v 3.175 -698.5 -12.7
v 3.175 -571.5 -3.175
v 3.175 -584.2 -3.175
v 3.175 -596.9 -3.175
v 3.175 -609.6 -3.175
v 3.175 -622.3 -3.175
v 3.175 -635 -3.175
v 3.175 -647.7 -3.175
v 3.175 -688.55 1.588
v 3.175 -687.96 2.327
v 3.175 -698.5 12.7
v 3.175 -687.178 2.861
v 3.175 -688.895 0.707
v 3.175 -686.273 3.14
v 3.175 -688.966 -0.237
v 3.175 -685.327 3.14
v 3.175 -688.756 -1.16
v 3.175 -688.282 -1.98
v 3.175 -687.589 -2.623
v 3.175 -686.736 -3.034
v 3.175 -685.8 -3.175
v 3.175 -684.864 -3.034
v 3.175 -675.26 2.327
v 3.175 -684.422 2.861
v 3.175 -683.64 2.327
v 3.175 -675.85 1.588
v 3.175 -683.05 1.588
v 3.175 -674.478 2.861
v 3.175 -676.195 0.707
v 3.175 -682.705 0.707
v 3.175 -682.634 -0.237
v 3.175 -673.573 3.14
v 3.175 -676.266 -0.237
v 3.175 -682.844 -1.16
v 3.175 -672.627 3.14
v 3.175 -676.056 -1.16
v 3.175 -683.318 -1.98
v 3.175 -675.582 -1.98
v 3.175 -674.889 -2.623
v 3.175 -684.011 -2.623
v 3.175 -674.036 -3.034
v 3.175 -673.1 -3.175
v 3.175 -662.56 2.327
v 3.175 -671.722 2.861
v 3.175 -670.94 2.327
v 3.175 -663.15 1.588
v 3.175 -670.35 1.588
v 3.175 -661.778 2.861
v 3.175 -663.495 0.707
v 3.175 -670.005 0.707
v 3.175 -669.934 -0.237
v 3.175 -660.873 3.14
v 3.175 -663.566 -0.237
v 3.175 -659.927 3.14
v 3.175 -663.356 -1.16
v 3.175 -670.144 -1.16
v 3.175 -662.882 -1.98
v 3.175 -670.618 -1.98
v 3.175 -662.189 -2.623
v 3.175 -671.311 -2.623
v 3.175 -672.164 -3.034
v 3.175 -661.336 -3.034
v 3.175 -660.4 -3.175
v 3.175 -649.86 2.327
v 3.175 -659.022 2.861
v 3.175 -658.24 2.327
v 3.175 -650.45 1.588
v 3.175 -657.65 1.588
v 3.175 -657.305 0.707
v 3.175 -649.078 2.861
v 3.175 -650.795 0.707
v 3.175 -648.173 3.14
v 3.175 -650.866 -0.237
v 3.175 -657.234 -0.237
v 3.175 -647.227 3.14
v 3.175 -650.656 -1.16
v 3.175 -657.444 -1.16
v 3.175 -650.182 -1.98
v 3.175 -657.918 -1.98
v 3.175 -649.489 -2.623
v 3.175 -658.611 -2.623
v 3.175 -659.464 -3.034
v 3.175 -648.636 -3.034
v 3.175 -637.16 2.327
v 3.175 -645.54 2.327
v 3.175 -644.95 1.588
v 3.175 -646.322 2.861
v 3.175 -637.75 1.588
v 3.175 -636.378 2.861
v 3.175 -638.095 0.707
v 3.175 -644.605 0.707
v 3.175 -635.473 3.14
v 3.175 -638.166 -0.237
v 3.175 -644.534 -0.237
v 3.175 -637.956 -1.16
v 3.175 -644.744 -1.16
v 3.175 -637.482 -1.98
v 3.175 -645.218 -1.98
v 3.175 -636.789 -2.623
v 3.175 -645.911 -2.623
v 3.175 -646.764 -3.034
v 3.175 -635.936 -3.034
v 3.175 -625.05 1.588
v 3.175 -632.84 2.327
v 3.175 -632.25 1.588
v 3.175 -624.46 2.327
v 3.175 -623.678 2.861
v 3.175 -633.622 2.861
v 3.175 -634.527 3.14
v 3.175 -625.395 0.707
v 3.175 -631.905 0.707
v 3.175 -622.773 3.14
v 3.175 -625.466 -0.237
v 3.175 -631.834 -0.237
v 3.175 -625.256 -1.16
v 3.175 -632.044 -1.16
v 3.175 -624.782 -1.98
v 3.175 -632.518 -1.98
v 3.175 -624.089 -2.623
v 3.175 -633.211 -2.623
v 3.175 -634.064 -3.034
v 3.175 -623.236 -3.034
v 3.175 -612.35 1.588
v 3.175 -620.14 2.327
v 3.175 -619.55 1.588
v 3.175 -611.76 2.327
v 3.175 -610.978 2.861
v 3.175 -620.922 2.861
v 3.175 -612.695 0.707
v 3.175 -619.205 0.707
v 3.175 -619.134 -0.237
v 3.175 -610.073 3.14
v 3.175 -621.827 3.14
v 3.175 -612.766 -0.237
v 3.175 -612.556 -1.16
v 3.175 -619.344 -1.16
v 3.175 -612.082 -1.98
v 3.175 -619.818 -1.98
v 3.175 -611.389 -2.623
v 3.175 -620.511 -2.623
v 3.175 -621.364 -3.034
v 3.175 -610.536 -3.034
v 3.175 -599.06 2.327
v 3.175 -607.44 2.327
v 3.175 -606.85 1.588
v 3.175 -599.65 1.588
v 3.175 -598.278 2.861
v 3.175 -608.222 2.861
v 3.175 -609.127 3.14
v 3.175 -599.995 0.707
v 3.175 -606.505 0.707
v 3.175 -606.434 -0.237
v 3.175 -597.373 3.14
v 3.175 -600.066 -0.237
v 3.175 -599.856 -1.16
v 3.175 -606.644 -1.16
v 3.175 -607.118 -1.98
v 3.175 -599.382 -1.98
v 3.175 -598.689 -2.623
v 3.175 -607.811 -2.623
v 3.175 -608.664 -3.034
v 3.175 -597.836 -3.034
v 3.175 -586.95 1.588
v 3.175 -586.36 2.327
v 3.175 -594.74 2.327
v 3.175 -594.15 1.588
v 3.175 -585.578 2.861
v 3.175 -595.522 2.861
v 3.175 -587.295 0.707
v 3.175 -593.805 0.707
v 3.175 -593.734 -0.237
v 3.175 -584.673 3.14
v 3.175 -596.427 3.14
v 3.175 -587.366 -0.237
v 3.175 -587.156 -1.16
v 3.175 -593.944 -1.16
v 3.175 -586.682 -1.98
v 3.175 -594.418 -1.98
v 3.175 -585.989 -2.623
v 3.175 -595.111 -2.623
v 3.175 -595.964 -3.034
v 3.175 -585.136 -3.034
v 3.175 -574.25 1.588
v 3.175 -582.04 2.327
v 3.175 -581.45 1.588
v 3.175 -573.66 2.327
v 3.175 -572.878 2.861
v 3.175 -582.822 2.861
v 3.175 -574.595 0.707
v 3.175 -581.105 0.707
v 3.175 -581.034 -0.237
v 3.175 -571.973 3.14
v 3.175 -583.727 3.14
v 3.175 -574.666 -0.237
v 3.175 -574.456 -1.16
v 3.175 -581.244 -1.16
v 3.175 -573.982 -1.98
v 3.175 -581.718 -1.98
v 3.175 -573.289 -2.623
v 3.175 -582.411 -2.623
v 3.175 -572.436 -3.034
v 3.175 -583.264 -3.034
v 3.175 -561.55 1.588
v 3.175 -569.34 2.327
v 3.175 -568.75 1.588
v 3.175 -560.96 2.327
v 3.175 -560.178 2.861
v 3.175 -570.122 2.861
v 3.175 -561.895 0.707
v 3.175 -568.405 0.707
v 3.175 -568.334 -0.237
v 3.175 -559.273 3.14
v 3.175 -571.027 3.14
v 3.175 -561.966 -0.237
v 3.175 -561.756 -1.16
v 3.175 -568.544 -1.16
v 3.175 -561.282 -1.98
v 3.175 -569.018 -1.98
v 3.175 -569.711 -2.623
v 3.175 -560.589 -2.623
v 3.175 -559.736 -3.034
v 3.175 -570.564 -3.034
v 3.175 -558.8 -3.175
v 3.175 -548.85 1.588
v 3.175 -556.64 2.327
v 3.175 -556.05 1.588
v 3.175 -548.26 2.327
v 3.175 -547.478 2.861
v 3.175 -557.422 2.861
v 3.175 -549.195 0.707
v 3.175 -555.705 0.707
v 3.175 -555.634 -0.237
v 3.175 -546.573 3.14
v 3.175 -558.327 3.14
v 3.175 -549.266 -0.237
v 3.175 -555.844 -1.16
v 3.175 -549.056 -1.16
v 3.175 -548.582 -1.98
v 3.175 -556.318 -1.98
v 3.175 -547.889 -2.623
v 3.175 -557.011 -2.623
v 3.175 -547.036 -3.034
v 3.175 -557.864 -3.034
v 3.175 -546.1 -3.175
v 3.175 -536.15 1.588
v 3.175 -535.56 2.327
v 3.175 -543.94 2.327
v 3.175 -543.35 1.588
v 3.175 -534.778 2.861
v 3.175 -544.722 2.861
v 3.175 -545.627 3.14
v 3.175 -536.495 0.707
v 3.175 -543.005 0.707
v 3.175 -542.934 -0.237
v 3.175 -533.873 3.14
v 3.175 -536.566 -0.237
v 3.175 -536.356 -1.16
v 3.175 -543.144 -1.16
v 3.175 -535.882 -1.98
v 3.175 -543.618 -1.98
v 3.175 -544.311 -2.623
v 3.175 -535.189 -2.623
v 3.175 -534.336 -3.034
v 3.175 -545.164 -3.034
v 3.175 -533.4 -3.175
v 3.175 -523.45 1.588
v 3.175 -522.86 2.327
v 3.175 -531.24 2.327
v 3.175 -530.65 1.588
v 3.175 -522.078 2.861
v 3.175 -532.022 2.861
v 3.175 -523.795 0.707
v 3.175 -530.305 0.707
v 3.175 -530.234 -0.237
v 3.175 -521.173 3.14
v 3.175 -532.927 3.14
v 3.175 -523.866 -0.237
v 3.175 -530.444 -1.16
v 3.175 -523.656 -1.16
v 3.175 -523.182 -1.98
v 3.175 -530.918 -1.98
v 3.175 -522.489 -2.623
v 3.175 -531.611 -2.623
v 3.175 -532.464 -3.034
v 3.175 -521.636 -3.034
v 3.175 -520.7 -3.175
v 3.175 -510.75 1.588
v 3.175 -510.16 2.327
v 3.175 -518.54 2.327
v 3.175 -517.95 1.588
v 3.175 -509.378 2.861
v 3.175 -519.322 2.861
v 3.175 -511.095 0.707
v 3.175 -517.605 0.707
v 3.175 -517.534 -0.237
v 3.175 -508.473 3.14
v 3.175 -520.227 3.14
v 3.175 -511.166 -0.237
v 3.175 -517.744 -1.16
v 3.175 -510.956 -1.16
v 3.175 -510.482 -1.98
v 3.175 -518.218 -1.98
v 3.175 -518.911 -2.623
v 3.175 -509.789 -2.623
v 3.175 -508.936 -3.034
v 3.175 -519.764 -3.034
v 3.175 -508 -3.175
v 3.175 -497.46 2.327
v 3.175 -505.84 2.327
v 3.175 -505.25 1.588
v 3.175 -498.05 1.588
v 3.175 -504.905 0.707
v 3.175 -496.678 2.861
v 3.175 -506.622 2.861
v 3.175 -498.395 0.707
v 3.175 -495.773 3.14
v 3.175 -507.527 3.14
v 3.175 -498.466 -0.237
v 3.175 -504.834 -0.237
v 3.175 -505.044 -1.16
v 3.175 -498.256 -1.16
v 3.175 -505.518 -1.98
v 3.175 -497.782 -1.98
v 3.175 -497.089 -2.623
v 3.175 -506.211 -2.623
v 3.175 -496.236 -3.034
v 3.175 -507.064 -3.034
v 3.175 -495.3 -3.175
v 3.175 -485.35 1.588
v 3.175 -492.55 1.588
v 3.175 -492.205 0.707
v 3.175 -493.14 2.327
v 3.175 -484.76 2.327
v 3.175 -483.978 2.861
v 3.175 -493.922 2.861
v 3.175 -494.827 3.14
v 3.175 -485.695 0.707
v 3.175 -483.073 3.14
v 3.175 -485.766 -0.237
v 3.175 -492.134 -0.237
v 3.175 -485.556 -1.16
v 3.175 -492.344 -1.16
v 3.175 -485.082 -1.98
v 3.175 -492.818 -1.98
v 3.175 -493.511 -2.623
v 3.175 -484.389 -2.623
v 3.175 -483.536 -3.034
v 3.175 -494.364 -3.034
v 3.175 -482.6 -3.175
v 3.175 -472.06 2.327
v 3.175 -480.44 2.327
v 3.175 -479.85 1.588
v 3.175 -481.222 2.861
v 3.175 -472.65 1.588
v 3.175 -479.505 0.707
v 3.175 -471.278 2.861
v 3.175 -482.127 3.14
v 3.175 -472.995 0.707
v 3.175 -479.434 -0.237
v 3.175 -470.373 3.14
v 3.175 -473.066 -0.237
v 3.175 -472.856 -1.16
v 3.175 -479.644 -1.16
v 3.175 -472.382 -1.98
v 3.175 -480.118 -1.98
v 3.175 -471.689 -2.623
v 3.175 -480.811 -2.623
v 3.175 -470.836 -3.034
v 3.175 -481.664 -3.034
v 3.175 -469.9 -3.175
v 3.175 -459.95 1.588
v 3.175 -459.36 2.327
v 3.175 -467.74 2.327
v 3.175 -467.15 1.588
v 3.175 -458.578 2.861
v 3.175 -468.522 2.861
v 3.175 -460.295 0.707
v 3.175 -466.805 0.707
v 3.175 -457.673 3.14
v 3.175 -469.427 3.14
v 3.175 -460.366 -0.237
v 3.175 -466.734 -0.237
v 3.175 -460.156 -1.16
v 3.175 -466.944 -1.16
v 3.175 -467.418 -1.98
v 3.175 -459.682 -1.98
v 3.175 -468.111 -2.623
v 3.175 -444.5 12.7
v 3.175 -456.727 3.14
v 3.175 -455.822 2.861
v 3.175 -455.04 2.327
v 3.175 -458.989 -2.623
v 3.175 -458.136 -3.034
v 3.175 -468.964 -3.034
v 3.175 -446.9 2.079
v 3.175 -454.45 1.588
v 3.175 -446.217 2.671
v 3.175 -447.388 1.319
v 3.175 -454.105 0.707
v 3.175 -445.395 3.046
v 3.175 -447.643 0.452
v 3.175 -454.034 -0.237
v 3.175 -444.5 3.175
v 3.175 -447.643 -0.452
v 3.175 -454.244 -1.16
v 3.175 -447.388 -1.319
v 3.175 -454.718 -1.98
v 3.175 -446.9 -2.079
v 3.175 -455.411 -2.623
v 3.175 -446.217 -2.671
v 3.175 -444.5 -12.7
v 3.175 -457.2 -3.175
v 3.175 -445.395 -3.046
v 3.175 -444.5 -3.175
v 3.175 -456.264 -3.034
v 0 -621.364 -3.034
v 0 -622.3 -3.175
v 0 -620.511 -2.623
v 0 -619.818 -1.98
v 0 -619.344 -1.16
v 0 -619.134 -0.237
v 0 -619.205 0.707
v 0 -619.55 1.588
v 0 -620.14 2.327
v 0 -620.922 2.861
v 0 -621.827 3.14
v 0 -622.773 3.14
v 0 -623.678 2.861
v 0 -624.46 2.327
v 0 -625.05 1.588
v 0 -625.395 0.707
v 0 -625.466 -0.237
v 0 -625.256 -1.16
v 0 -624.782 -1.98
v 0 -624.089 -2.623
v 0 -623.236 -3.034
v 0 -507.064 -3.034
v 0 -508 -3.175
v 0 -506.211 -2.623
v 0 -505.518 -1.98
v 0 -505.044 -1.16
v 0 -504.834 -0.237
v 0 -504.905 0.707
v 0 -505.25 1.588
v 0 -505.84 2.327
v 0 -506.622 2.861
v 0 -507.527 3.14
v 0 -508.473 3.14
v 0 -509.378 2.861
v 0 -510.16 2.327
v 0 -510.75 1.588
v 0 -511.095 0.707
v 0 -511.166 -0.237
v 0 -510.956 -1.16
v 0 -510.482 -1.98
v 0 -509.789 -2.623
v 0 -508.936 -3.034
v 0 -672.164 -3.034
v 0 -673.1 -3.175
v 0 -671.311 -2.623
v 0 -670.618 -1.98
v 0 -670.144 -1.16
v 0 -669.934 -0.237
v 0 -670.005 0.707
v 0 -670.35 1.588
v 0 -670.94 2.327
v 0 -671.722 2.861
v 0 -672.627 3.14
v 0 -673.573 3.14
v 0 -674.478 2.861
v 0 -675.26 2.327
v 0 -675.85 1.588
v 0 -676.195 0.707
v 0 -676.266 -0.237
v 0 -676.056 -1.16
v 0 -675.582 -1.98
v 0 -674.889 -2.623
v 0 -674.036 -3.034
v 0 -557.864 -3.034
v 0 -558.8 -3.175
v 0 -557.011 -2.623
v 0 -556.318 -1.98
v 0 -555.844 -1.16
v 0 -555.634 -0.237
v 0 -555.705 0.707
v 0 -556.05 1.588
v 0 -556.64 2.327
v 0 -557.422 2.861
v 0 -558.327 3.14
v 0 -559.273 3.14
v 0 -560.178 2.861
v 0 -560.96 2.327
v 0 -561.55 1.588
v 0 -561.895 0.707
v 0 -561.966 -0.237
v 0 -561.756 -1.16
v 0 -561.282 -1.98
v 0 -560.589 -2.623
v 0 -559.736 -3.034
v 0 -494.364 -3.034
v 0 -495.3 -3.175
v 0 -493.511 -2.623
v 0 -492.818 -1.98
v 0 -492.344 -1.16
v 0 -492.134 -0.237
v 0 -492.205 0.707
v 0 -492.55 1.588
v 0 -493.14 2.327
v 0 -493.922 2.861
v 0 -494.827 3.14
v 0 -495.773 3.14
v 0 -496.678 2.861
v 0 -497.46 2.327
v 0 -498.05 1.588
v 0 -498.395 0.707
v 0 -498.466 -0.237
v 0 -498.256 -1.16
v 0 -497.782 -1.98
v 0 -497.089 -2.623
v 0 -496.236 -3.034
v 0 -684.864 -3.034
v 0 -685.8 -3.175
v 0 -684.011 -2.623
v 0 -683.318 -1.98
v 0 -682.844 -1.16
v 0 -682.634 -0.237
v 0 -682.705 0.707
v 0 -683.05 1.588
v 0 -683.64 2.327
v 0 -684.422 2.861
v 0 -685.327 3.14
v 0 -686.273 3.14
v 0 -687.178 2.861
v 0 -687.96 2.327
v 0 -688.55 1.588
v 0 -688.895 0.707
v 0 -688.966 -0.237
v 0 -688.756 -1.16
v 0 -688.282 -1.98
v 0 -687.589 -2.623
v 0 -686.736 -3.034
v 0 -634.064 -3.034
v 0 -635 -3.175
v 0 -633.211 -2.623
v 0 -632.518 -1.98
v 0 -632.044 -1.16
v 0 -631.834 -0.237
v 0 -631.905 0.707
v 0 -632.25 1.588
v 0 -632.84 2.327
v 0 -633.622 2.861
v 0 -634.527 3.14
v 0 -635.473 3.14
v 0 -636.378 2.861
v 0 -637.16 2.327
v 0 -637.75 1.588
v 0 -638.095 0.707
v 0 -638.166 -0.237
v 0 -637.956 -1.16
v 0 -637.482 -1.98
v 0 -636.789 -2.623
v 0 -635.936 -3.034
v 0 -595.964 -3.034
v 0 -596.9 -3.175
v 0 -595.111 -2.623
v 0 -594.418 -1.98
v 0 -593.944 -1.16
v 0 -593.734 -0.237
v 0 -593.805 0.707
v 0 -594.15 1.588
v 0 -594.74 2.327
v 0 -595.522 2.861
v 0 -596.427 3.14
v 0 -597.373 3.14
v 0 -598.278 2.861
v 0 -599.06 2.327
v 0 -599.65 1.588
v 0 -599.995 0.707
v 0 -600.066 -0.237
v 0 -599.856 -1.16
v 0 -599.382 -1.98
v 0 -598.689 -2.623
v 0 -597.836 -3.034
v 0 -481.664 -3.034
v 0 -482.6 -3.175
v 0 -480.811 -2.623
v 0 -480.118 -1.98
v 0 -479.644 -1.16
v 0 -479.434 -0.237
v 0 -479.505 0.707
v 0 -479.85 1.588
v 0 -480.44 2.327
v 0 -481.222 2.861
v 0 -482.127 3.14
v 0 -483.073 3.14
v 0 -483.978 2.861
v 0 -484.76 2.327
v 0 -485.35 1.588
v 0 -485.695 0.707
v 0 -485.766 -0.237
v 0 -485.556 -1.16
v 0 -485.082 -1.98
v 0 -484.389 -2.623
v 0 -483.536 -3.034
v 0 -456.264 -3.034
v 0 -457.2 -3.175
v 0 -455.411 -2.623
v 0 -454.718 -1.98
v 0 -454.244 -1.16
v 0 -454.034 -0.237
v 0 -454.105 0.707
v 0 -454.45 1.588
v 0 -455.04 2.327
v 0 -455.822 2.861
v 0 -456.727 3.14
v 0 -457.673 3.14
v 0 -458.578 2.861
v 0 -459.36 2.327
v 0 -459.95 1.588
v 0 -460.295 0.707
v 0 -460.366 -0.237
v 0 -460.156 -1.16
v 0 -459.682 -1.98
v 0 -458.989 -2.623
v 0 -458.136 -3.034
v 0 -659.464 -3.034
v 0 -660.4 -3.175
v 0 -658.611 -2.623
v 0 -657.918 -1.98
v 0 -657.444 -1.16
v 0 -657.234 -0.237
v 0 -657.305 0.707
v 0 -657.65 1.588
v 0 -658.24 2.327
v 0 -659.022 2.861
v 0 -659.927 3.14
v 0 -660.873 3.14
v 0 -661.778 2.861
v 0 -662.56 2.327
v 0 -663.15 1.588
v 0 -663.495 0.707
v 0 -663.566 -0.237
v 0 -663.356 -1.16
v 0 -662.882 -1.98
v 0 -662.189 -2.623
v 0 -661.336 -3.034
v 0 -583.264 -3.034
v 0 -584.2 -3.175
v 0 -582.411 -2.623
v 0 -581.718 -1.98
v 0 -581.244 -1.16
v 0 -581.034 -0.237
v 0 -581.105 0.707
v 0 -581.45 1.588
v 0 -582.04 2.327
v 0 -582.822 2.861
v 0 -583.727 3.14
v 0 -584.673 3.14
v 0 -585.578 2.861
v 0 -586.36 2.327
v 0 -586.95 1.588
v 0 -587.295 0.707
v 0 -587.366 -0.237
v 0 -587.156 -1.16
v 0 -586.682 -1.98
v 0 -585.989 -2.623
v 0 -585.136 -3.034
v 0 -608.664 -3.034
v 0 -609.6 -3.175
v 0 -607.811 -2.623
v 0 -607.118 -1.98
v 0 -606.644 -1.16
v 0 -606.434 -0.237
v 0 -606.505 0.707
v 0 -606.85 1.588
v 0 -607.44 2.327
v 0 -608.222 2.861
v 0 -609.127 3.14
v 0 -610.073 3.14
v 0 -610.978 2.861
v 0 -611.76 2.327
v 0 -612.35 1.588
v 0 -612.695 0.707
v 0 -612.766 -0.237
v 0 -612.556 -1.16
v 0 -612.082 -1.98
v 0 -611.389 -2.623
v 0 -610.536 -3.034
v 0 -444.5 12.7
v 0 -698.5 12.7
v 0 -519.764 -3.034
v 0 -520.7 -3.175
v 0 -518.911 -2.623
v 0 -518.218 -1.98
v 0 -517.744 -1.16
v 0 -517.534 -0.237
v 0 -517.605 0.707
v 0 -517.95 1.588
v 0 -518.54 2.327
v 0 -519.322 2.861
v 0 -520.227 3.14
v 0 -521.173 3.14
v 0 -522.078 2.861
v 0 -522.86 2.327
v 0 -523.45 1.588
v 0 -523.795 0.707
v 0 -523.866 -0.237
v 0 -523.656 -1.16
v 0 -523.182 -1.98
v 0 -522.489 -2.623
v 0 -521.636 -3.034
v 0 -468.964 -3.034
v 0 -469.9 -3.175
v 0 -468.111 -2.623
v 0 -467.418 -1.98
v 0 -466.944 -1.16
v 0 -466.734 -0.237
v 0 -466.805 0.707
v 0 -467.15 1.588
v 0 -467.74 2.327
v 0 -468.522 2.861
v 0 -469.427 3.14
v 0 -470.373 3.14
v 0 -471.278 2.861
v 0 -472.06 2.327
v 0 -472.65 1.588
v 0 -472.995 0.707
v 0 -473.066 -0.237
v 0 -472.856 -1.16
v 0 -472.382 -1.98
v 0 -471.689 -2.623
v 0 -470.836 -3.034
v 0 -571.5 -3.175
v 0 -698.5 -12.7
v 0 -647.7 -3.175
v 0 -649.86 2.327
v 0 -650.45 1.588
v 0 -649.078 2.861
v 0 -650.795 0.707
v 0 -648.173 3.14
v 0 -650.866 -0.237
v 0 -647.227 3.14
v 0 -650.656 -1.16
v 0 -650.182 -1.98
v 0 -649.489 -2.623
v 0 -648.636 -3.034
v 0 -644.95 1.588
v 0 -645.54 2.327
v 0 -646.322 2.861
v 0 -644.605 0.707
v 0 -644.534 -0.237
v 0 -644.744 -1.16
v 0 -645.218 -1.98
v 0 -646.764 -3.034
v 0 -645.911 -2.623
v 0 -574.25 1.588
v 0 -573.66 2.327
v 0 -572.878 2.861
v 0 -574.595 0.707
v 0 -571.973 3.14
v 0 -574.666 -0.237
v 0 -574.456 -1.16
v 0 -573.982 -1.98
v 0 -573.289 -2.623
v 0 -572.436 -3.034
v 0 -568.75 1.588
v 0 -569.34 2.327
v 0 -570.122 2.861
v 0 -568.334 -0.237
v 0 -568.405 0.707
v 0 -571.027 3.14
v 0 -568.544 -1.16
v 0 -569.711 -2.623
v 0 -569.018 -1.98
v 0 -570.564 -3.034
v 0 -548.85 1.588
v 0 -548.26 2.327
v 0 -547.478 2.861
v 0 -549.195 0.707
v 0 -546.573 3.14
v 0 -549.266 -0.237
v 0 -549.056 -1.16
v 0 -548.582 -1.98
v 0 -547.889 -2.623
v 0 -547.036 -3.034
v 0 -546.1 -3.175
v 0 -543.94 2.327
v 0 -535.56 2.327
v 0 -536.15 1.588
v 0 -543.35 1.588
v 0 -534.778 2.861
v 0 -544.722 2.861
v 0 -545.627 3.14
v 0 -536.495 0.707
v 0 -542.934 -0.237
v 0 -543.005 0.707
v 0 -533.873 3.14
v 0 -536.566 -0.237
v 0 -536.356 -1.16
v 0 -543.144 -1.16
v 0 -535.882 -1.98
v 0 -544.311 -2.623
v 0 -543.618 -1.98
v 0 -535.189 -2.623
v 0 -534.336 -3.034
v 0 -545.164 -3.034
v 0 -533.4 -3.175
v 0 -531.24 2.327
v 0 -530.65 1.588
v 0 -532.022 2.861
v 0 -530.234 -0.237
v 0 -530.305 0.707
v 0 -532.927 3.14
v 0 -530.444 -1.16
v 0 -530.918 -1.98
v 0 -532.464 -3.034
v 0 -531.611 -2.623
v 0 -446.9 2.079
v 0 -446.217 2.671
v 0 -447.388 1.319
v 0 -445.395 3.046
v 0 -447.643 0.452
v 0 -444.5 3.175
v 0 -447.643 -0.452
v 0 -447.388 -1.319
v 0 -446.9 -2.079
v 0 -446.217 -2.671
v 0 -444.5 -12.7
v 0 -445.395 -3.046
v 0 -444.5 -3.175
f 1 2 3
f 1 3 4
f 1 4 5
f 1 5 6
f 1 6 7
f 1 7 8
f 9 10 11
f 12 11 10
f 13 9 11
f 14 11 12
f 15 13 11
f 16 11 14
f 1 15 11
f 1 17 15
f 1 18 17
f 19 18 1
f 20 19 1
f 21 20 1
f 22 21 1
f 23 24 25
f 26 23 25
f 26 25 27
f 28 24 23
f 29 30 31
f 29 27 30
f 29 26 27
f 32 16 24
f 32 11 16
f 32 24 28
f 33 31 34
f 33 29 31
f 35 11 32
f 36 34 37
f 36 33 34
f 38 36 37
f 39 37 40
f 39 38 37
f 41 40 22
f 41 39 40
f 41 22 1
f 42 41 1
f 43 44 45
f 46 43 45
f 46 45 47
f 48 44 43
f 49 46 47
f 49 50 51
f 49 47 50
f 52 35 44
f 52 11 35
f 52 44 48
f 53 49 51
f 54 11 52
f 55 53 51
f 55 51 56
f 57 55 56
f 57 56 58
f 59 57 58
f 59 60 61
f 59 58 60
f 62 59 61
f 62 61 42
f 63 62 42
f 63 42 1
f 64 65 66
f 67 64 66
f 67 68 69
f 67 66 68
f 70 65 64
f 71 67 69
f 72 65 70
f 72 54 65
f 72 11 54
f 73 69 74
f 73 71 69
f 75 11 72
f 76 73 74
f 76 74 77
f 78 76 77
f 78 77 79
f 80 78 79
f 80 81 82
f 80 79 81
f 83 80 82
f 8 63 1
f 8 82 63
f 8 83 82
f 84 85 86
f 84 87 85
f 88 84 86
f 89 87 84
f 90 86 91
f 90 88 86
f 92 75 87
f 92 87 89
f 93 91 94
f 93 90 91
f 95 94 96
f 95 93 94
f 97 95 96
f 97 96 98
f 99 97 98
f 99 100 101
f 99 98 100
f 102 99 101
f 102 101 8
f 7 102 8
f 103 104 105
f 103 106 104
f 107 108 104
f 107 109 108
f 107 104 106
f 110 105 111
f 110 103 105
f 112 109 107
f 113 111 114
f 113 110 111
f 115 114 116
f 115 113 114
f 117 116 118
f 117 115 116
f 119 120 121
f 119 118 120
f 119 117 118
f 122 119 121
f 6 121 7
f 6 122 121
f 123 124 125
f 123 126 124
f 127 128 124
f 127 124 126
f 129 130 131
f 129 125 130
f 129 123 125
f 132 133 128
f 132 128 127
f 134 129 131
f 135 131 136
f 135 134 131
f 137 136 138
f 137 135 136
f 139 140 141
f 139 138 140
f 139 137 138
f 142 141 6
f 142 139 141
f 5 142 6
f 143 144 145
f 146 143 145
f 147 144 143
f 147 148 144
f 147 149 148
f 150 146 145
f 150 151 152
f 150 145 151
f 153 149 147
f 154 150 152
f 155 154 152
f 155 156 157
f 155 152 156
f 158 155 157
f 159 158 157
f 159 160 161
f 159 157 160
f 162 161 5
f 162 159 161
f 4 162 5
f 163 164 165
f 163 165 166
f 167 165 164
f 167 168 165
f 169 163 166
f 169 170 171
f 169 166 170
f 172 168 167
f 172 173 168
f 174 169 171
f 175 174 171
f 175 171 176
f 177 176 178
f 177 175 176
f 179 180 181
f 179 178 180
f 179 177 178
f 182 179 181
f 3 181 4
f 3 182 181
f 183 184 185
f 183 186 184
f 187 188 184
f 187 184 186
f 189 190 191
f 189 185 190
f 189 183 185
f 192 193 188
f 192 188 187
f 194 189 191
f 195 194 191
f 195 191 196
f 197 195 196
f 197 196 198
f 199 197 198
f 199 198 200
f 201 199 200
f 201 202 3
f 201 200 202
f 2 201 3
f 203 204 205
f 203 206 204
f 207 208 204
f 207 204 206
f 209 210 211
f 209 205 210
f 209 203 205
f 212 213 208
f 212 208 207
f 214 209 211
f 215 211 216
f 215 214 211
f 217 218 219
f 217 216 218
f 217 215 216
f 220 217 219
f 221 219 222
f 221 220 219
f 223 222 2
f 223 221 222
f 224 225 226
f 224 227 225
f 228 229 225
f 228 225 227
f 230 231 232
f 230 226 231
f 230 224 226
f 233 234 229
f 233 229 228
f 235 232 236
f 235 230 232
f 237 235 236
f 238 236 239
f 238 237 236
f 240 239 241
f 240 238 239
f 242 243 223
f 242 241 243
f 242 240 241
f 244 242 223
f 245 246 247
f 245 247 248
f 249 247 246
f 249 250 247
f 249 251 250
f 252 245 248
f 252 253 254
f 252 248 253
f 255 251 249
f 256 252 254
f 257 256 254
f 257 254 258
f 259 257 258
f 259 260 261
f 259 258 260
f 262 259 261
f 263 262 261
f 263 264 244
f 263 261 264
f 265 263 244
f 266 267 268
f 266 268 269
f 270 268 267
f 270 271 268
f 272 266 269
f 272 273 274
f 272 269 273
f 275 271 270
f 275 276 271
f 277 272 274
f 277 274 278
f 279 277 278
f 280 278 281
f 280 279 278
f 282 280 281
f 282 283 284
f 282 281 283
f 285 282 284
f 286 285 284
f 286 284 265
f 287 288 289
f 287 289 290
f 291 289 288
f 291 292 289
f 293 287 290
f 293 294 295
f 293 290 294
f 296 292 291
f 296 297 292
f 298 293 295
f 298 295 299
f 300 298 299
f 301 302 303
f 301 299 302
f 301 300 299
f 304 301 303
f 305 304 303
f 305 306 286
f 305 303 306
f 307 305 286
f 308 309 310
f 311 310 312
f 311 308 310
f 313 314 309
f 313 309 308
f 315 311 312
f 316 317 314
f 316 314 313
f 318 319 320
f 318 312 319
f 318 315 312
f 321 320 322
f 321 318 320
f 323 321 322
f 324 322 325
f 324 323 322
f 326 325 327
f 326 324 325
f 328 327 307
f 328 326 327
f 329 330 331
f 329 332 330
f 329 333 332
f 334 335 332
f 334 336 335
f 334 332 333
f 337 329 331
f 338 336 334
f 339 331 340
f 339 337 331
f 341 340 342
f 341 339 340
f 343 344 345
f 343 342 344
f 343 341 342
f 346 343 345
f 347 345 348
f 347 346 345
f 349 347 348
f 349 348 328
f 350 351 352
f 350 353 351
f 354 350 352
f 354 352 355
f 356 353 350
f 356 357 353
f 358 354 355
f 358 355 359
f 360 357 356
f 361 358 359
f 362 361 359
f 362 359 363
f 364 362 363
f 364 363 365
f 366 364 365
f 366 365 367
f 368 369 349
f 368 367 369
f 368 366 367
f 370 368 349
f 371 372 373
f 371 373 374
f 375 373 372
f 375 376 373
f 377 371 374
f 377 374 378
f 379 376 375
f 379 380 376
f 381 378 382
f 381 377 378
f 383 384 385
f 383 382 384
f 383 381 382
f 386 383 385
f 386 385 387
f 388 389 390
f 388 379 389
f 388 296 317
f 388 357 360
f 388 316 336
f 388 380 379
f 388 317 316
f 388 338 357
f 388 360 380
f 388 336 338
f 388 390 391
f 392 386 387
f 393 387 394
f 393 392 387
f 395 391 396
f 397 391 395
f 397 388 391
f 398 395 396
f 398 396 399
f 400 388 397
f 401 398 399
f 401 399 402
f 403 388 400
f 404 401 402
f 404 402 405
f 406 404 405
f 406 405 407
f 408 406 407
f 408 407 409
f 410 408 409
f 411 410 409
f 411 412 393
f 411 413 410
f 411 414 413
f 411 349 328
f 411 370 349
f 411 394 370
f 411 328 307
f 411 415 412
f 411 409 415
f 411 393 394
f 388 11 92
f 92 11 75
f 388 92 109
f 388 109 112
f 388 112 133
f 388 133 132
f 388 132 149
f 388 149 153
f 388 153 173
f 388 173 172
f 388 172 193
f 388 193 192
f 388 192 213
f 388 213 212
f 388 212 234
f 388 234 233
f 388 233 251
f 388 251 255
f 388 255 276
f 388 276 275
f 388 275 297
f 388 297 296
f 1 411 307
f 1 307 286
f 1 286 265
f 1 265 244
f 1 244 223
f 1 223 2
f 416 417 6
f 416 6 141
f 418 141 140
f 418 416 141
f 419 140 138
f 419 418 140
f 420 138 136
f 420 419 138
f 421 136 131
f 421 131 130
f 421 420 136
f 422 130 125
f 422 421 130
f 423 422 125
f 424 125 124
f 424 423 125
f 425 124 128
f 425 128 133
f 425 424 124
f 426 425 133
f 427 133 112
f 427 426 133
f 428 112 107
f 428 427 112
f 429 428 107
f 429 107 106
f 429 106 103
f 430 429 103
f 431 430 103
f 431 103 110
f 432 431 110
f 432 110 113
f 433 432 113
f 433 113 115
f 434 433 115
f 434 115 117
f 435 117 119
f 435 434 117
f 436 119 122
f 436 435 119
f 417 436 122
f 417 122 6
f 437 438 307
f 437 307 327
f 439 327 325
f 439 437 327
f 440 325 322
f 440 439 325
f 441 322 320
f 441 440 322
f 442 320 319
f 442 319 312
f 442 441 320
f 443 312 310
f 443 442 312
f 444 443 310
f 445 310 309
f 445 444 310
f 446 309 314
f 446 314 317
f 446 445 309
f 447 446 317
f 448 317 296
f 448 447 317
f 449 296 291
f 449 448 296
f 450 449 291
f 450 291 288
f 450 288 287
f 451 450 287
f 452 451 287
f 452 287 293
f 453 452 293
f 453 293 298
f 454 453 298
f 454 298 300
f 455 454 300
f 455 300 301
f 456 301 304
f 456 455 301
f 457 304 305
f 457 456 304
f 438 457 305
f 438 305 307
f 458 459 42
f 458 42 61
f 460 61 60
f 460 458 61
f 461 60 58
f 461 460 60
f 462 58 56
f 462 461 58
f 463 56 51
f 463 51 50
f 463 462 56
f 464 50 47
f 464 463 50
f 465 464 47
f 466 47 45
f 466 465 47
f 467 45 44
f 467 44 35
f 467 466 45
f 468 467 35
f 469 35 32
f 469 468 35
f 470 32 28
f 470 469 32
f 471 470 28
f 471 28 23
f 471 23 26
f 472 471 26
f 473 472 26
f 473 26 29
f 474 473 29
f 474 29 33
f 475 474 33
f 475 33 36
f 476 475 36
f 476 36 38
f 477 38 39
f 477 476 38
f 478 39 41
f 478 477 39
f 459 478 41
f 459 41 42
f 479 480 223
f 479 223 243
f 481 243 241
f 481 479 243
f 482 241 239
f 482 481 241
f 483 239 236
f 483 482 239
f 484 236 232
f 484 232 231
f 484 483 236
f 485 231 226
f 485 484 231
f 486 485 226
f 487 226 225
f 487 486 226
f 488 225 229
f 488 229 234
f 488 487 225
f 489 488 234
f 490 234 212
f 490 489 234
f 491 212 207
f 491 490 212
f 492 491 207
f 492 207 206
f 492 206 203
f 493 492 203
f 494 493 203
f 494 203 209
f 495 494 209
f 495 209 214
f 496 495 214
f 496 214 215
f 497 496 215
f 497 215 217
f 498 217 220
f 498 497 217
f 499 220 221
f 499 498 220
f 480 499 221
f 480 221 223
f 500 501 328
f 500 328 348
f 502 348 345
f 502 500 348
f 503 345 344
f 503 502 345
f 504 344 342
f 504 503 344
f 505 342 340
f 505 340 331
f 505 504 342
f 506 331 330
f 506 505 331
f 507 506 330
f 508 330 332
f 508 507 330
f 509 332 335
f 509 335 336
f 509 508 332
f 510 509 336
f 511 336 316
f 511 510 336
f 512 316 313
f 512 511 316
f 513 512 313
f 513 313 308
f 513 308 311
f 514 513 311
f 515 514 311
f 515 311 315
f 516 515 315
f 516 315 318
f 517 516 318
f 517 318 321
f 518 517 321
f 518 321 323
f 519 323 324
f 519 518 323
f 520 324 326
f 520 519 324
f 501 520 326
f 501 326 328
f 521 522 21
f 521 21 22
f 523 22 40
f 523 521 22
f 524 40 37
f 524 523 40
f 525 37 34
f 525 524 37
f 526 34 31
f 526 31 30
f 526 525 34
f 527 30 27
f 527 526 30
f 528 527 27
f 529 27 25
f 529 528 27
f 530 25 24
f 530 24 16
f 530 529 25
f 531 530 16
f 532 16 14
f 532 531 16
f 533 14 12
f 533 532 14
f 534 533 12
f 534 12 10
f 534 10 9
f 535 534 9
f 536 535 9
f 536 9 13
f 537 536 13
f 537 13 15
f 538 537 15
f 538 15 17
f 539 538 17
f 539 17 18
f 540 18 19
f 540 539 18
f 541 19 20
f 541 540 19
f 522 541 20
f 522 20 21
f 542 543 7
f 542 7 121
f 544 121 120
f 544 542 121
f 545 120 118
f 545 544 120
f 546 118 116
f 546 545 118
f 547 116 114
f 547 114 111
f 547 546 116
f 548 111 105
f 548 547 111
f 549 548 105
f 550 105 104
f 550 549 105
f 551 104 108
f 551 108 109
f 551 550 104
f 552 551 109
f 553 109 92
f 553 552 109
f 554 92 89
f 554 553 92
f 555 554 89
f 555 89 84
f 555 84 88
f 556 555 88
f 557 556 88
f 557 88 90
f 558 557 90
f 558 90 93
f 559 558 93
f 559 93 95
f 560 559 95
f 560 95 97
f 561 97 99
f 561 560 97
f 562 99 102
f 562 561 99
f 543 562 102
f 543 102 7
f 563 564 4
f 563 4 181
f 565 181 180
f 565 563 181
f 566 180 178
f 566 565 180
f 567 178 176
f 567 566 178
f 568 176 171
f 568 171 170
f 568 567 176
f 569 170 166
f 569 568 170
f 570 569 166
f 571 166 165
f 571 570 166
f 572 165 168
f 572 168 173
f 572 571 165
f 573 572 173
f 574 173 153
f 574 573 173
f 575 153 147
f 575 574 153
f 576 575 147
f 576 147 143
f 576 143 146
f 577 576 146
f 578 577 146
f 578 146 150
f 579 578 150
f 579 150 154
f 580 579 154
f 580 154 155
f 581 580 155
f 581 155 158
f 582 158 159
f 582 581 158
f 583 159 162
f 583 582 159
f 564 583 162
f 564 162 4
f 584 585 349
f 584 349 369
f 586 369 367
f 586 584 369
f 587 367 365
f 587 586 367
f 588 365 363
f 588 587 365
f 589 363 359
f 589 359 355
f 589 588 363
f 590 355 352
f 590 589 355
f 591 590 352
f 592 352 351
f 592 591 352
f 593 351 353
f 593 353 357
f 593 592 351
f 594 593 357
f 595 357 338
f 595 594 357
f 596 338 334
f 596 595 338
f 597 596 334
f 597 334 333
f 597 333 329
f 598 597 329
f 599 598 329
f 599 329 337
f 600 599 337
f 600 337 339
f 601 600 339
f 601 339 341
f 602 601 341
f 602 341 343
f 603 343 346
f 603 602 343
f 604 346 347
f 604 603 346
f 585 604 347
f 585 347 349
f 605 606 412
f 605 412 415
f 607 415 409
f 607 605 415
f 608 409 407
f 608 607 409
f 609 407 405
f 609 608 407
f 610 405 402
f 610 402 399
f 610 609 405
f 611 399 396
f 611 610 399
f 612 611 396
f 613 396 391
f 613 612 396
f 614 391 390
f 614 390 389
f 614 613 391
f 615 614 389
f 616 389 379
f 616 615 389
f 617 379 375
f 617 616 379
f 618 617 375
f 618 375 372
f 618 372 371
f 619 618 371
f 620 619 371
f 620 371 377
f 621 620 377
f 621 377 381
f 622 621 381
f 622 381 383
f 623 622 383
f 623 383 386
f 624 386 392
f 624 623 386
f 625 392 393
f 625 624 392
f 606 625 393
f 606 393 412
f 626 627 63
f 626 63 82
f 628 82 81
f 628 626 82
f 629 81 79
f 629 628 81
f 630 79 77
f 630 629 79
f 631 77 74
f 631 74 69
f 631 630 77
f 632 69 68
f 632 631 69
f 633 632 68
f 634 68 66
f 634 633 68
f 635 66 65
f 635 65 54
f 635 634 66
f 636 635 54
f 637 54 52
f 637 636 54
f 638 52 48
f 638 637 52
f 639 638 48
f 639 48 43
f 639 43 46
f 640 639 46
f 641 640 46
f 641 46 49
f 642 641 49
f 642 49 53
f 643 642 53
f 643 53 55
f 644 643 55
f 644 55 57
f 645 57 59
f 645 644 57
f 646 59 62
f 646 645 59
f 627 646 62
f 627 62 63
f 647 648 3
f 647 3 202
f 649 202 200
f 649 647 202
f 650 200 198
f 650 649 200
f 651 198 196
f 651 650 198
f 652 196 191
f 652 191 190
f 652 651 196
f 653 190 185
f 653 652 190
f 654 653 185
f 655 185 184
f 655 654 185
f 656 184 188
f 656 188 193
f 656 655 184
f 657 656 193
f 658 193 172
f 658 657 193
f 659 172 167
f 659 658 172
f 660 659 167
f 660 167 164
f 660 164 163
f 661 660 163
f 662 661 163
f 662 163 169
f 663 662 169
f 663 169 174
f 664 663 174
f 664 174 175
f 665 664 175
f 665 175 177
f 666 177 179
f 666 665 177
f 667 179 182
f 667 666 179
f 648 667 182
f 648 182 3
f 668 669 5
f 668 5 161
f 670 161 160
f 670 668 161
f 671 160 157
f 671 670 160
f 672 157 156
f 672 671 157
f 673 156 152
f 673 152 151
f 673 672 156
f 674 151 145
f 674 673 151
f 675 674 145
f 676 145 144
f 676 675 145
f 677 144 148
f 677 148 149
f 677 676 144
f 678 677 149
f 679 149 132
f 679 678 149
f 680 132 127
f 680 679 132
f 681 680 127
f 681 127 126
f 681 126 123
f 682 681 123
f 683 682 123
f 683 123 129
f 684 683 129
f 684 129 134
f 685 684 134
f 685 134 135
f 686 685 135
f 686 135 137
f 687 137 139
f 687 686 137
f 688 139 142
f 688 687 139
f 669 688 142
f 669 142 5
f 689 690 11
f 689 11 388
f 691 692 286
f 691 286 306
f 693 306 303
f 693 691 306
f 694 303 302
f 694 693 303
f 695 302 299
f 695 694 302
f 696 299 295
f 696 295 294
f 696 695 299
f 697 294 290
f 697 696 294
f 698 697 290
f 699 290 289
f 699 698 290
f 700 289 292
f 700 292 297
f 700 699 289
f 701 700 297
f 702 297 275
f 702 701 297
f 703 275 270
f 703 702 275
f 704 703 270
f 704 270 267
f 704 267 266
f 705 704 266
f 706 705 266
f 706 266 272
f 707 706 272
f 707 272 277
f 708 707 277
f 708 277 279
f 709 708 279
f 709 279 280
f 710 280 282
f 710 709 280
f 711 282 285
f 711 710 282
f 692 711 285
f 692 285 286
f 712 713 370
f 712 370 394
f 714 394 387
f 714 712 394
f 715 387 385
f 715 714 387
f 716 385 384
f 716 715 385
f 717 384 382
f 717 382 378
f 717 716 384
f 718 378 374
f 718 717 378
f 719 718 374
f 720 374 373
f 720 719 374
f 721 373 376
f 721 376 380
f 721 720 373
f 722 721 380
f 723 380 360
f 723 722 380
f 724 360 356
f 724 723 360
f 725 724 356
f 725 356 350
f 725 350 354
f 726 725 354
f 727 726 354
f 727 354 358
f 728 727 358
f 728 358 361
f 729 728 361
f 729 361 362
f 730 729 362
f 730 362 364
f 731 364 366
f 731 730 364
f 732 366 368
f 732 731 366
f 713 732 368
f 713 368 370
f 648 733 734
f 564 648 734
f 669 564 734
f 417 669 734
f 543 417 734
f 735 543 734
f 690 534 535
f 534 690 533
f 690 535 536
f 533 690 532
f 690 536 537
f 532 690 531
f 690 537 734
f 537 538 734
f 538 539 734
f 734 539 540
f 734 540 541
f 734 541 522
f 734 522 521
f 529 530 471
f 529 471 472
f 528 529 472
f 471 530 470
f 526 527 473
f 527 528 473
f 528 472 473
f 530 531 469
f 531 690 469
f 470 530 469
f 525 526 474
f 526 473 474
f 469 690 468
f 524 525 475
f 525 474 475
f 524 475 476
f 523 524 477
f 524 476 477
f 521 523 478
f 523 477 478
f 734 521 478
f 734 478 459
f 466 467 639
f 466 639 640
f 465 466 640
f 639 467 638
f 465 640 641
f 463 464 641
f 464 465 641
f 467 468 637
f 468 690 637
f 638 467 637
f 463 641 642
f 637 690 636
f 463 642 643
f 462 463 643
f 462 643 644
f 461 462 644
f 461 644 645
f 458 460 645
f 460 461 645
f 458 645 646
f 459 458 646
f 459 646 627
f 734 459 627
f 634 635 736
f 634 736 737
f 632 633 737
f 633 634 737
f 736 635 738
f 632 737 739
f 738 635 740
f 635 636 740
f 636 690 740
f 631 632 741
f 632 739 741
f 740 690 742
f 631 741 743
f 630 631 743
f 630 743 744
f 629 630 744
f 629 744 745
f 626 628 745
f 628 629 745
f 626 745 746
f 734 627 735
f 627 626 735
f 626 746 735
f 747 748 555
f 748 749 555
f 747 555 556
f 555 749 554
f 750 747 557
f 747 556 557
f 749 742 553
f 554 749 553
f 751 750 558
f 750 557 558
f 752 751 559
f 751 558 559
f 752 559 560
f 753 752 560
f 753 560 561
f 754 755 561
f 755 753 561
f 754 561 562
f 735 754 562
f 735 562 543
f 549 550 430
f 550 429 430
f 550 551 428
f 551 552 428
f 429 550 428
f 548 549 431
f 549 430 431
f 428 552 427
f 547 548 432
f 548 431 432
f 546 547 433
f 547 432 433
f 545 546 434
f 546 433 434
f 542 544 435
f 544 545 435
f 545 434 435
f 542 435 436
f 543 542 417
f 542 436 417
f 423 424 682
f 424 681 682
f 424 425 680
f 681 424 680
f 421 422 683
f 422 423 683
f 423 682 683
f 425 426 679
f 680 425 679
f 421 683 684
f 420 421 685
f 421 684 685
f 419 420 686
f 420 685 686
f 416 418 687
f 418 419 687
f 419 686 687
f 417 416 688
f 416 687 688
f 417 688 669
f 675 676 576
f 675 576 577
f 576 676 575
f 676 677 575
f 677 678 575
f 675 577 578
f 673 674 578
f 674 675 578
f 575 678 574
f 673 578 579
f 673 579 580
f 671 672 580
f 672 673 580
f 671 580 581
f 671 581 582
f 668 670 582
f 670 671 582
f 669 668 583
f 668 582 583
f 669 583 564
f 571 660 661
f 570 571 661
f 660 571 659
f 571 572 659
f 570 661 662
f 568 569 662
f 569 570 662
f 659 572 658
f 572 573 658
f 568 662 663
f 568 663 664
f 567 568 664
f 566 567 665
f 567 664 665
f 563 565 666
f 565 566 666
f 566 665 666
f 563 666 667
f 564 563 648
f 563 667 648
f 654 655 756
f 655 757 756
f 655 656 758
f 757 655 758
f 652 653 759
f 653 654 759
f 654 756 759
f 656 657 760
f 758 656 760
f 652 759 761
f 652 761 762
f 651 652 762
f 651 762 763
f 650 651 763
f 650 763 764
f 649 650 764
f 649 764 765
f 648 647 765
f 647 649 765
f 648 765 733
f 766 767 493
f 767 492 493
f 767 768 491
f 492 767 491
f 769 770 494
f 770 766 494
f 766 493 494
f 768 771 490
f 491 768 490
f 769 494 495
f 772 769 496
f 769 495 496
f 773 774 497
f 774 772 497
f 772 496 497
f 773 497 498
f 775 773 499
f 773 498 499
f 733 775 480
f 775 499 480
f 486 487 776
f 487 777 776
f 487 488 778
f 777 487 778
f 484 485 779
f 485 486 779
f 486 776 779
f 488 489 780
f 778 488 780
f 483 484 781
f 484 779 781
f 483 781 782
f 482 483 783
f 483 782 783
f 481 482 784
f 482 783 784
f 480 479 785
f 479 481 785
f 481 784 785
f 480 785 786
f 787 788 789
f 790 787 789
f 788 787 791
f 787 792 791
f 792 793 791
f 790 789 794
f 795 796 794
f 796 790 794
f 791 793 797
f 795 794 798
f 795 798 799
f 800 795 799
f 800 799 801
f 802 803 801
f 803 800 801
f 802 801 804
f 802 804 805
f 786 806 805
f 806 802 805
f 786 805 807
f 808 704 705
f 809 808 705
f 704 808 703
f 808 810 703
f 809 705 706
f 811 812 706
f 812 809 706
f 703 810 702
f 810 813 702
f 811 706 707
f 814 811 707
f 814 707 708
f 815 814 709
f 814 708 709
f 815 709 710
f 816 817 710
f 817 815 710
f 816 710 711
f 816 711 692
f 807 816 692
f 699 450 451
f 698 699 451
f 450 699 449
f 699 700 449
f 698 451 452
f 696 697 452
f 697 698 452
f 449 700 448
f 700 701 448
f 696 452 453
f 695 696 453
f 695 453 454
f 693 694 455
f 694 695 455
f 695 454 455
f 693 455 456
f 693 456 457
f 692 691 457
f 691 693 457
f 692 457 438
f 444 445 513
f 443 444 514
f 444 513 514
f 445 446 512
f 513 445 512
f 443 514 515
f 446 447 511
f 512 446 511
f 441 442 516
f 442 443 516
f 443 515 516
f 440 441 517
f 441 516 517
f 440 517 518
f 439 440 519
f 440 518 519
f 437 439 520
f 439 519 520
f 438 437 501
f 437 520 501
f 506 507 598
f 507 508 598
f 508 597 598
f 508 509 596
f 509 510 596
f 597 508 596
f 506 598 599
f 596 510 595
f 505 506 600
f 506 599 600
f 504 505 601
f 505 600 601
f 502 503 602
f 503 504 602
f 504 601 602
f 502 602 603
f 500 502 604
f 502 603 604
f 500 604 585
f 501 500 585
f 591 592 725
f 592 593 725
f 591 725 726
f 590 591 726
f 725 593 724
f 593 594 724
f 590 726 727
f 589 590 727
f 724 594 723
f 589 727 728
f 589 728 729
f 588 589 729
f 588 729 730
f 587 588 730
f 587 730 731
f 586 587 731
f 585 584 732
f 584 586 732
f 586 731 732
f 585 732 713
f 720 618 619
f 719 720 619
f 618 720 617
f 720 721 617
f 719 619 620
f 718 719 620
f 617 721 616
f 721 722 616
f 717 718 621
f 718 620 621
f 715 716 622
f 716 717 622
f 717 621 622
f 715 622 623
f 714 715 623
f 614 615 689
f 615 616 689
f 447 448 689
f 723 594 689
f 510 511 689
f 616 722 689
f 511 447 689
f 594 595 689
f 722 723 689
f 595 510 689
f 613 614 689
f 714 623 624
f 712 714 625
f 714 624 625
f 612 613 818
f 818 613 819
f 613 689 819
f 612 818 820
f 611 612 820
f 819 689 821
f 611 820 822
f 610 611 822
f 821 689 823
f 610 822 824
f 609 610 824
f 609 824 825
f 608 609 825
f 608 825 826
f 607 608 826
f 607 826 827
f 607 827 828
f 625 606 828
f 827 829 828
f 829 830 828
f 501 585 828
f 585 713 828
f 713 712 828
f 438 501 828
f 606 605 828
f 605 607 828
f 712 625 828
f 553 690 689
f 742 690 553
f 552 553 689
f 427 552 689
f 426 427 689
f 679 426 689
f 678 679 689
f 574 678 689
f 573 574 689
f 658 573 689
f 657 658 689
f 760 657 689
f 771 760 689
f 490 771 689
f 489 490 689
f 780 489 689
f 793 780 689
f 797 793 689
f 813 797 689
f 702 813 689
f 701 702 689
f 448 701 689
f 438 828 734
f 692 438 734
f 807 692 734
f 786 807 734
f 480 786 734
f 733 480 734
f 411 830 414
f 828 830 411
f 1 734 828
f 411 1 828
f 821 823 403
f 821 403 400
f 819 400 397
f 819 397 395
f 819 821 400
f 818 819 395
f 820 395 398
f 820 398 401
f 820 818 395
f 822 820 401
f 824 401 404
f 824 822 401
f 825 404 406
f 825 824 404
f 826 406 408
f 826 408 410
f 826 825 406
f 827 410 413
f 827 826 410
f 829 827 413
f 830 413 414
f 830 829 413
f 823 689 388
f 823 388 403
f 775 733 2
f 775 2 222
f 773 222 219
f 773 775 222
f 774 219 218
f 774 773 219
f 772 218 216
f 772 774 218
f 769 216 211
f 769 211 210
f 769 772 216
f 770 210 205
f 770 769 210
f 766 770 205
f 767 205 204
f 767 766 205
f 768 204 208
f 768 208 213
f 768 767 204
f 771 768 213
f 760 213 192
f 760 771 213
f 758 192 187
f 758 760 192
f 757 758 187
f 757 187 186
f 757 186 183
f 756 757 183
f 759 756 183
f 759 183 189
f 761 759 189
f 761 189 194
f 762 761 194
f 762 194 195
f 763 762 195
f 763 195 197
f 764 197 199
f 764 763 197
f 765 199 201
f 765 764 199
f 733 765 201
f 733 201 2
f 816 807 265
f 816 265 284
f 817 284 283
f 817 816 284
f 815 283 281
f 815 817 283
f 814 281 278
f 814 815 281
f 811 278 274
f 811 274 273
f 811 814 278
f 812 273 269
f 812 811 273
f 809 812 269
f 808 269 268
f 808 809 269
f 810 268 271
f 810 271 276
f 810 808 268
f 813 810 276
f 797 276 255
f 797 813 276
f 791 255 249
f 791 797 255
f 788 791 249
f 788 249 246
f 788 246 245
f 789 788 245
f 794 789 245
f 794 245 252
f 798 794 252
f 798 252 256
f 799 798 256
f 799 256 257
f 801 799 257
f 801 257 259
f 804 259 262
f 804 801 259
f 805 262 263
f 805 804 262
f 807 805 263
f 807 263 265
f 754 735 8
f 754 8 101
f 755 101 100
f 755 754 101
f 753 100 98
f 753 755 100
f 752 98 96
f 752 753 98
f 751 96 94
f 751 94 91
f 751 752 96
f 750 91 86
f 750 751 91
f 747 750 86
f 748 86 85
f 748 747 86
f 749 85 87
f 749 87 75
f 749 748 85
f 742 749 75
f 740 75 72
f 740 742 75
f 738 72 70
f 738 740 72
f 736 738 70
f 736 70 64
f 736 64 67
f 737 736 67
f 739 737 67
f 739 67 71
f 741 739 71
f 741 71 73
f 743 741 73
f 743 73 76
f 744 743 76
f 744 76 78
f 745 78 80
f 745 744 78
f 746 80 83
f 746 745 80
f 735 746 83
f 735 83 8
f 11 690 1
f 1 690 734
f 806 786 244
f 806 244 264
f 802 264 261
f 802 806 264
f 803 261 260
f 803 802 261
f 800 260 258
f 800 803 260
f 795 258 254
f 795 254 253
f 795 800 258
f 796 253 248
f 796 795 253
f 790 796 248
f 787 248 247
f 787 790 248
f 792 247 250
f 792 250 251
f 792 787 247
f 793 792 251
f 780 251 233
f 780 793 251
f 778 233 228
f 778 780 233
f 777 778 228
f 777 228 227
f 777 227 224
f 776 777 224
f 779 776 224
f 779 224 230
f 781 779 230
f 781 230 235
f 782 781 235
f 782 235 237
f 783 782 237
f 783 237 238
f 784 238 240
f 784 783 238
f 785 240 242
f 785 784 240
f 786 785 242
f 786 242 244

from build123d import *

# Parameters (mm, degrees)
SKETCH1_W               = 25.4
SKETCH1_H               = 1397
SKETCH1_R               = 3.175
BOSS_EXTRUDE1_DEPTH     = 3.175
CUT_EXTRUDE1_DEPTH      = 699.622659685
CUT_EXTRUDE1_DEPTH_BACK = 699.622659685
SKETCH2_W               = 25.4
SKETCH2_H               = 1143


with BuildPart() as part:
    # Sketch1 → Boss-Extrude1 (new body)
    with BuildSketch(Plane(origin=(0, 0, 0), x_dir=(0, 0, -1), z_dir=(1, 0, 0))):
        Rectangle(SKETCH1_W, SKETCH1_H)
        with Locations((0, -685.8)):
            Circle(SKETCH1_R, mode=Mode.SUBTRACT)
        with Locations((0, -673.1)):
            Circle(SKETCH1_R, mode=Mode.SUBTRACT)
        with Locations((0, -660.4)):
            Circle(SKETCH1_R, mode=Mode.SUBTRACT)
        with Locations((0, -647.7)):
            Circle(SKETCH1_R, mode=Mode.SUBTRACT)
        with Locations((0, -635)):
            Circle(SKETCH1_R, mode=Mode.SUBTRACT)
        with Locations((0, -622.3)):
            Circle(SKETCH1_R, mode=Mode.SUBTRACT)
        with Locations((0, -609.6)):
            Circle(SKETCH1_R, mode=Mode.SUBTRACT)
        with Locations((0, -596.9)):
            Circle(SKETCH1_R, mode=Mode.SUBTRACT)
        with Locations((0, -584.2)):
            Circle(SKETCH1_R, mode=Mode.SUBTRACT)
        with Locations((0, -571.5)):
            Circle(SKETCH1_R, mode=Mode.SUBTRACT)
        with Locations((0, -558.8)):
            Circle(SKETCH1_R, mode=Mode.SUBTRACT)
        with Locations((0, -546.1)):
            Circle(SKETCH1_R, mode=Mode.SUBTRACT)
        with Locations((0, -533.4)):
            Circle(SKETCH1_R, mode=Mode.SUBTRACT)
        with Locations((0, -520.7)):
            Circle(SKETCH1_R, mode=Mode.SUBTRACT)
        with Locations((0, -508)):
            Circle(SKETCH1_R, mode=Mode.SUBTRACT)
        with Locations((0, -495.3)):
            Circle(SKETCH1_R, mode=Mode.SUBTRACT)
        with Locations((0, -482.6)):
            Circle(SKETCH1_R, mode=Mode.SUBTRACT)
        with Locations((0, -469.9)):
            Circle(SKETCH1_R, mode=Mode.SUBTRACT)
        with Locations((0, -457.2)):
            Circle(SKETCH1_R, mode=Mode.SUBTRACT)
        with Locations((0, -444.5)):
            Circle(SKETCH1_R, mode=Mode.SUBTRACT)
        with Locations((0, -431.8)):
            Circle(SKETCH1_R, mode=Mode.SUBTRACT)
        with Locations((0, -419.1)):
            Circle(SKETCH1_R, mode=Mode.SUBTRACT)
        with Locations((0, -406.4)):
            Circle(SKETCH1_R, mode=Mode.SUBTRACT)
        with Locations((0, -393.7)):
            Circle(SKETCH1_R, mode=Mode.SUBTRACT)
        with Locations((0, -381)):
            Circle(SKETCH1_R, mode=Mode.SUBTRACT)
        with Locations((0, -368.3)):
            Circle(SKETCH1_R, mode=Mode.SUBTRACT)
        with Locations((0, -355.6)):
            Circle(SKETCH1_R, mode=Mode.SUBTRACT)
        with Locations((0, -342.9)):
            Circle(SKETCH1_R, mode=Mode.SUBTRACT)
        with Locations((0, -330.2)):
            Circle(SKETCH1_R, mode=Mode.SUBTRACT)
        with Locations((0, -317.5)):
            Circle(SKETCH1_R, mode=Mode.SUBTRACT)
        with Locations((0, -304.8)):
            Circle(SKETCH1_R, mode=Mode.SUBTRACT)
        with Locations((0, -292.1)):
            Circle(SKETCH1_R, mode=Mode.SUBTRACT)
        with Locations((0, -279.4)):
            Circle(SKETCH1_R, mode=Mode.SUBTRACT)
        with Locations((0, -266.7)):
            Circle(SKETCH1_R, mode=Mode.SUBTRACT)
        with Locations((0, -254)):
            Circle(SKETCH1_R, mode=Mode.SUBTRACT)
        with Locations((0, -241.3)):
            Circle(SKETCH1_R, mode=Mode.SUBTRACT)
        with Locations((0, -228.6)):
            Circle(SKETCH1_R, mode=Mode.SUBTRACT)
        with Locations((0, -215.9)):
            Circle(SKETCH1_R, mode=Mode.SUBTRACT)
        with Locations((0, -203.2)):
            Circle(SKETCH1_R, mode=Mode.SUBTRACT)
        with Locations((0, -190.5)):
            Circle(SKETCH1_R, mode=Mode.SUBTRACT)
        with Locations((0, -177.8)):
            Circle(SKETCH1_R, mode=Mode.SUBTRACT)
        with Locations((0, -165.1)):
            Circle(SKETCH1_R, mode=Mode.SUBTRACT)
        with Locations((0, -152.4)):
            Circle(SKETCH1_R, mode=Mode.SUBTRACT)
        with Locations((0, -139.7)):
            Circle(SKETCH1_R, mode=Mode.SUBTRACT)
        with Locations((0, -127)):
            Circle(SKETCH1_R, mode=Mode.SUBTRACT)
        with Locations((0, -114.3)):
            Circle(SKETCH1_R, mode=Mode.SUBTRACT)
        with Locations((0, -101.6)):
            Circle(SKETCH1_R, mode=Mode.SUBTRACT)
        with Locations((0, -88.9)):
            Circle(SKETCH1_R, mode=Mode.SUBTRACT)
        with Locations((0, -76.2)):
            Circle(SKETCH1_R, mode=Mode.SUBTRACT)
        with Locations((0, -63.5)):
            Circle(SKETCH1_R, mode=Mode.SUBTRACT)
        with Locations((0, -50.8)):
            Circle(SKETCH1_R, mode=Mode.SUBTRACT)
        with Locations((0, -38.1)):
            Circle(SKETCH1_R, mode=Mode.SUBTRACT)
        with Locations((0, -25.4)):
            Circle(SKETCH1_R, mode=Mode.SUBTRACT)
        with Locations((0, -12.7)):
            Circle(SKETCH1_R, mode=Mode.SUBTRACT)
        Circle(SKETCH1_R, mode=Mode.SUBTRACT)
        with Locations((0, 12.7)):
            Circle(SKETCH1_R, mode=Mode.SUBTRACT)
        with Locations((0, 25.4)):
            Circle(SKETCH1_R, mode=Mode.SUBTRACT)
        with Locations((0, 38.1)):
            Circle(SKETCH1_R, mode=Mode.SUBTRACT)
        with Locations((0, 50.8)):
            Circle(SKETCH1_R, mode=Mode.SUBTRACT)
        with Locations((0, 63.5)):
            Circle(SKETCH1_R, mode=Mode.SUBTRACT)
        with Locations((0, 76.2)):
            Circle(SKETCH1_R, mode=Mode.SUBTRACT)
        with Locations((0, 88.9)):
            Circle(SKETCH1_R, mode=Mode.SUBTRACT)
        with Locations((0, 101.6)):
            Circle(SKETCH1_R, mode=Mode.SUBTRACT)
        with Locations((0, 114.3)):
            Circle(SKETCH1_R, mode=Mode.SUBTRACT)
        with Locations((0, 127)):
            Circle(SKETCH1_R, mode=Mode.SUBTRACT)
        with Locations((0, 139.7)):
            Circle(SKETCH1_R, mode=Mode.SUBTRACT)
        with Locations((0, 152.4)):
            Circle(SKETCH1_R, mode=Mode.SUBTRACT)
        with Locations((0, 165.1)):
            Circle(SKETCH1_R, mode=Mode.SUBTRACT)
        with Locations((0, 177.8)):
            Circle(SKETCH1_R, mode=Mode.SUBTRACT)
        with Locations((0, 190.5)):
            Circle(SKETCH1_R, mode=Mode.SUBTRACT)
        with Locations((0, 203.2)):
            Circle(SKETCH1_R, mode=Mode.SUBTRACT)
        with Locations((0, 215.9)):
            Circle(SKETCH1_R, mode=Mode.SUBTRACT)
        with Locations((0, 228.6)):
            Circle(SKETCH1_R, mode=Mode.SUBTRACT)
        with Locations((0, 241.3)):
            Circle(SKETCH1_R, mode=Mode.SUBTRACT)
        with Locations((0, 254)):
            Circle(SKETCH1_R, mode=Mode.SUBTRACT)
        with Locations((0, 266.7)):
            Circle(SKETCH1_R, mode=Mode.SUBTRACT)
        with Locations((0, 279.4)):
            Circle(SKETCH1_R, mode=Mode.SUBTRACT)
        with Locations((0, 292.1)):
            Circle(SKETCH1_R, mode=Mode.SUBTRACT)
        with Locations((0, 304.8)):
            Circle(SKETCH1_R, mode=Mode.SUBTRACT)
        with Locations((0, 317.5)):
            Circle(SKETCH1_R, mode=Mode.SUBTRACT)
        with Locations((0, 330.2)):
            Circle(SKETCH1_R, mode=Mode.SUBTRACT)
        with Locations((0, 342.9)):
            Circle(SKETCH1_R, mode=Mode.SUBTRACT)
        with Locations((0, 355.6)):
            Circle(SKETCH1_R, mode=Mode.SUBTRACT)
        with Locations((0, 368.3)):
            Circle(SKETCH1_R, mode=Mode.SUBTRACT)
        with Locations((0, 381)):
            Circle(SKETCH1_R, mode=Mode.SUBTRACT)
        with Locations((0, 393.7)):
            Circle(SKETCH1_R, mode=Mode.SUBTRACT)
        with Locations((0, 406.4)):
            Circle(SKETCH1_R, mode=Mode.SUBTRACT)
        with Locations((0, 419.1)):
            Circle(SKETCH1_R, mode=Mode.SUBTRACT)
        with Locations((0, 431.8)):
            Circle(SKETCH1_R, mode=Mode.SUBTRACT)
        with Locations((0, 444.5)):
            Circle(SKETCH1_R, mode=Mode.SUBTRACT)
        with Locations((0, 457.2)):
            Circle(SKETCH1_R, mode=Mode.SUBTRACT)
        with Locations((0, 469.9)):
            Circle(SKETCH1_R, mode=Mode.SUBTRACT)
        with Locations((0, 482.6)):
            Circle(SKETCH1_R, mode=Mode.SUBTRACT)
        with Locations((0, 495.3)):
            Circle(SKETCH1_R, mode=Mode.SUBTRACT)
        with Locations((0, 508)):
            Circle(SKETCH1_R, mode=Mode.SUBTRACT)
        with Locations((0, 520.7)):
            Circle(SKETCH1_R, mode=Mode.SUBTRACT)
        with Locations((0, 533.4)):
            Circle(SKETCH1_R, mode=Mode.SUBTRACT)
        with Locations((0, 546.1)):
            Circle(SKETCH1_R, mode=Mode.SUBTRACT)
        with Locations((0, 558.8)):
            Circle(SKETCH1_R, mode=Mode.SUBTRACT)
        with Locations((0, 571.5)):
            Circle(SKETCH1_R, mode=Mode.SUBTRACT)
        with Locations((0, 584.2)):
            Circle(SKETCH1_R, mode=Mode.SUBTRACT)
        with Locations((0, 596.9)):
            Circle(SKETCH1_R, mode=Mode.SUBTRACT)
        with Locations((0, 609.6)):
            Circle(SKETCH1_R, mode=Mode.SUBTRACT)
        with Locations((0, 622.3)):
            Circle(SKETCH1_R, mode=Mode.SUBTRACT)
        with Locations((0, 635)):
            Circle(SKETCH1_R, mode=Mode.SUBTRACT)
        with Locations((0, 647.7)):
            Circle(SKETCH1_R, mode=Mode.SUBTRACT)
        with Locations((0, 660.4)):
            Circle(SKETCH1_R, mode=Mode.SUBTRACT)
        with Locations((0, 673.1)):
            Circle(SKETCH1_R, mode=Mode.SUBTRACT)
        with Locations((0, 685.8)):
            Circle(SKETCH1_R, mode=Mode.SUBTRACT)
    extrude(amount=BOSS_EXTRUDE1_DEPTH)

    # Sketch2 → Cut-Extrude1 (cut, two sides: drawn at the far end of the back side and taken through both)
    with BuildSketch(Plane(origin=(3.175, 0, 0), x_dir=(0, 0, -1), z_dir=(1, 0, 0)).offset(-CUT_EXTRUDE1_DEPTH_BACK)):
        with Locations((0, 127)):
            Rectangle(SKETCH2_W, SKETCH2_H)
    extrude(amount=CUT_EXTRUDE1_DEPTH + CUT_EXTRUDE1_DEPTH_BACK, mode=Mode.SUBTRACT)


solid = part.part
